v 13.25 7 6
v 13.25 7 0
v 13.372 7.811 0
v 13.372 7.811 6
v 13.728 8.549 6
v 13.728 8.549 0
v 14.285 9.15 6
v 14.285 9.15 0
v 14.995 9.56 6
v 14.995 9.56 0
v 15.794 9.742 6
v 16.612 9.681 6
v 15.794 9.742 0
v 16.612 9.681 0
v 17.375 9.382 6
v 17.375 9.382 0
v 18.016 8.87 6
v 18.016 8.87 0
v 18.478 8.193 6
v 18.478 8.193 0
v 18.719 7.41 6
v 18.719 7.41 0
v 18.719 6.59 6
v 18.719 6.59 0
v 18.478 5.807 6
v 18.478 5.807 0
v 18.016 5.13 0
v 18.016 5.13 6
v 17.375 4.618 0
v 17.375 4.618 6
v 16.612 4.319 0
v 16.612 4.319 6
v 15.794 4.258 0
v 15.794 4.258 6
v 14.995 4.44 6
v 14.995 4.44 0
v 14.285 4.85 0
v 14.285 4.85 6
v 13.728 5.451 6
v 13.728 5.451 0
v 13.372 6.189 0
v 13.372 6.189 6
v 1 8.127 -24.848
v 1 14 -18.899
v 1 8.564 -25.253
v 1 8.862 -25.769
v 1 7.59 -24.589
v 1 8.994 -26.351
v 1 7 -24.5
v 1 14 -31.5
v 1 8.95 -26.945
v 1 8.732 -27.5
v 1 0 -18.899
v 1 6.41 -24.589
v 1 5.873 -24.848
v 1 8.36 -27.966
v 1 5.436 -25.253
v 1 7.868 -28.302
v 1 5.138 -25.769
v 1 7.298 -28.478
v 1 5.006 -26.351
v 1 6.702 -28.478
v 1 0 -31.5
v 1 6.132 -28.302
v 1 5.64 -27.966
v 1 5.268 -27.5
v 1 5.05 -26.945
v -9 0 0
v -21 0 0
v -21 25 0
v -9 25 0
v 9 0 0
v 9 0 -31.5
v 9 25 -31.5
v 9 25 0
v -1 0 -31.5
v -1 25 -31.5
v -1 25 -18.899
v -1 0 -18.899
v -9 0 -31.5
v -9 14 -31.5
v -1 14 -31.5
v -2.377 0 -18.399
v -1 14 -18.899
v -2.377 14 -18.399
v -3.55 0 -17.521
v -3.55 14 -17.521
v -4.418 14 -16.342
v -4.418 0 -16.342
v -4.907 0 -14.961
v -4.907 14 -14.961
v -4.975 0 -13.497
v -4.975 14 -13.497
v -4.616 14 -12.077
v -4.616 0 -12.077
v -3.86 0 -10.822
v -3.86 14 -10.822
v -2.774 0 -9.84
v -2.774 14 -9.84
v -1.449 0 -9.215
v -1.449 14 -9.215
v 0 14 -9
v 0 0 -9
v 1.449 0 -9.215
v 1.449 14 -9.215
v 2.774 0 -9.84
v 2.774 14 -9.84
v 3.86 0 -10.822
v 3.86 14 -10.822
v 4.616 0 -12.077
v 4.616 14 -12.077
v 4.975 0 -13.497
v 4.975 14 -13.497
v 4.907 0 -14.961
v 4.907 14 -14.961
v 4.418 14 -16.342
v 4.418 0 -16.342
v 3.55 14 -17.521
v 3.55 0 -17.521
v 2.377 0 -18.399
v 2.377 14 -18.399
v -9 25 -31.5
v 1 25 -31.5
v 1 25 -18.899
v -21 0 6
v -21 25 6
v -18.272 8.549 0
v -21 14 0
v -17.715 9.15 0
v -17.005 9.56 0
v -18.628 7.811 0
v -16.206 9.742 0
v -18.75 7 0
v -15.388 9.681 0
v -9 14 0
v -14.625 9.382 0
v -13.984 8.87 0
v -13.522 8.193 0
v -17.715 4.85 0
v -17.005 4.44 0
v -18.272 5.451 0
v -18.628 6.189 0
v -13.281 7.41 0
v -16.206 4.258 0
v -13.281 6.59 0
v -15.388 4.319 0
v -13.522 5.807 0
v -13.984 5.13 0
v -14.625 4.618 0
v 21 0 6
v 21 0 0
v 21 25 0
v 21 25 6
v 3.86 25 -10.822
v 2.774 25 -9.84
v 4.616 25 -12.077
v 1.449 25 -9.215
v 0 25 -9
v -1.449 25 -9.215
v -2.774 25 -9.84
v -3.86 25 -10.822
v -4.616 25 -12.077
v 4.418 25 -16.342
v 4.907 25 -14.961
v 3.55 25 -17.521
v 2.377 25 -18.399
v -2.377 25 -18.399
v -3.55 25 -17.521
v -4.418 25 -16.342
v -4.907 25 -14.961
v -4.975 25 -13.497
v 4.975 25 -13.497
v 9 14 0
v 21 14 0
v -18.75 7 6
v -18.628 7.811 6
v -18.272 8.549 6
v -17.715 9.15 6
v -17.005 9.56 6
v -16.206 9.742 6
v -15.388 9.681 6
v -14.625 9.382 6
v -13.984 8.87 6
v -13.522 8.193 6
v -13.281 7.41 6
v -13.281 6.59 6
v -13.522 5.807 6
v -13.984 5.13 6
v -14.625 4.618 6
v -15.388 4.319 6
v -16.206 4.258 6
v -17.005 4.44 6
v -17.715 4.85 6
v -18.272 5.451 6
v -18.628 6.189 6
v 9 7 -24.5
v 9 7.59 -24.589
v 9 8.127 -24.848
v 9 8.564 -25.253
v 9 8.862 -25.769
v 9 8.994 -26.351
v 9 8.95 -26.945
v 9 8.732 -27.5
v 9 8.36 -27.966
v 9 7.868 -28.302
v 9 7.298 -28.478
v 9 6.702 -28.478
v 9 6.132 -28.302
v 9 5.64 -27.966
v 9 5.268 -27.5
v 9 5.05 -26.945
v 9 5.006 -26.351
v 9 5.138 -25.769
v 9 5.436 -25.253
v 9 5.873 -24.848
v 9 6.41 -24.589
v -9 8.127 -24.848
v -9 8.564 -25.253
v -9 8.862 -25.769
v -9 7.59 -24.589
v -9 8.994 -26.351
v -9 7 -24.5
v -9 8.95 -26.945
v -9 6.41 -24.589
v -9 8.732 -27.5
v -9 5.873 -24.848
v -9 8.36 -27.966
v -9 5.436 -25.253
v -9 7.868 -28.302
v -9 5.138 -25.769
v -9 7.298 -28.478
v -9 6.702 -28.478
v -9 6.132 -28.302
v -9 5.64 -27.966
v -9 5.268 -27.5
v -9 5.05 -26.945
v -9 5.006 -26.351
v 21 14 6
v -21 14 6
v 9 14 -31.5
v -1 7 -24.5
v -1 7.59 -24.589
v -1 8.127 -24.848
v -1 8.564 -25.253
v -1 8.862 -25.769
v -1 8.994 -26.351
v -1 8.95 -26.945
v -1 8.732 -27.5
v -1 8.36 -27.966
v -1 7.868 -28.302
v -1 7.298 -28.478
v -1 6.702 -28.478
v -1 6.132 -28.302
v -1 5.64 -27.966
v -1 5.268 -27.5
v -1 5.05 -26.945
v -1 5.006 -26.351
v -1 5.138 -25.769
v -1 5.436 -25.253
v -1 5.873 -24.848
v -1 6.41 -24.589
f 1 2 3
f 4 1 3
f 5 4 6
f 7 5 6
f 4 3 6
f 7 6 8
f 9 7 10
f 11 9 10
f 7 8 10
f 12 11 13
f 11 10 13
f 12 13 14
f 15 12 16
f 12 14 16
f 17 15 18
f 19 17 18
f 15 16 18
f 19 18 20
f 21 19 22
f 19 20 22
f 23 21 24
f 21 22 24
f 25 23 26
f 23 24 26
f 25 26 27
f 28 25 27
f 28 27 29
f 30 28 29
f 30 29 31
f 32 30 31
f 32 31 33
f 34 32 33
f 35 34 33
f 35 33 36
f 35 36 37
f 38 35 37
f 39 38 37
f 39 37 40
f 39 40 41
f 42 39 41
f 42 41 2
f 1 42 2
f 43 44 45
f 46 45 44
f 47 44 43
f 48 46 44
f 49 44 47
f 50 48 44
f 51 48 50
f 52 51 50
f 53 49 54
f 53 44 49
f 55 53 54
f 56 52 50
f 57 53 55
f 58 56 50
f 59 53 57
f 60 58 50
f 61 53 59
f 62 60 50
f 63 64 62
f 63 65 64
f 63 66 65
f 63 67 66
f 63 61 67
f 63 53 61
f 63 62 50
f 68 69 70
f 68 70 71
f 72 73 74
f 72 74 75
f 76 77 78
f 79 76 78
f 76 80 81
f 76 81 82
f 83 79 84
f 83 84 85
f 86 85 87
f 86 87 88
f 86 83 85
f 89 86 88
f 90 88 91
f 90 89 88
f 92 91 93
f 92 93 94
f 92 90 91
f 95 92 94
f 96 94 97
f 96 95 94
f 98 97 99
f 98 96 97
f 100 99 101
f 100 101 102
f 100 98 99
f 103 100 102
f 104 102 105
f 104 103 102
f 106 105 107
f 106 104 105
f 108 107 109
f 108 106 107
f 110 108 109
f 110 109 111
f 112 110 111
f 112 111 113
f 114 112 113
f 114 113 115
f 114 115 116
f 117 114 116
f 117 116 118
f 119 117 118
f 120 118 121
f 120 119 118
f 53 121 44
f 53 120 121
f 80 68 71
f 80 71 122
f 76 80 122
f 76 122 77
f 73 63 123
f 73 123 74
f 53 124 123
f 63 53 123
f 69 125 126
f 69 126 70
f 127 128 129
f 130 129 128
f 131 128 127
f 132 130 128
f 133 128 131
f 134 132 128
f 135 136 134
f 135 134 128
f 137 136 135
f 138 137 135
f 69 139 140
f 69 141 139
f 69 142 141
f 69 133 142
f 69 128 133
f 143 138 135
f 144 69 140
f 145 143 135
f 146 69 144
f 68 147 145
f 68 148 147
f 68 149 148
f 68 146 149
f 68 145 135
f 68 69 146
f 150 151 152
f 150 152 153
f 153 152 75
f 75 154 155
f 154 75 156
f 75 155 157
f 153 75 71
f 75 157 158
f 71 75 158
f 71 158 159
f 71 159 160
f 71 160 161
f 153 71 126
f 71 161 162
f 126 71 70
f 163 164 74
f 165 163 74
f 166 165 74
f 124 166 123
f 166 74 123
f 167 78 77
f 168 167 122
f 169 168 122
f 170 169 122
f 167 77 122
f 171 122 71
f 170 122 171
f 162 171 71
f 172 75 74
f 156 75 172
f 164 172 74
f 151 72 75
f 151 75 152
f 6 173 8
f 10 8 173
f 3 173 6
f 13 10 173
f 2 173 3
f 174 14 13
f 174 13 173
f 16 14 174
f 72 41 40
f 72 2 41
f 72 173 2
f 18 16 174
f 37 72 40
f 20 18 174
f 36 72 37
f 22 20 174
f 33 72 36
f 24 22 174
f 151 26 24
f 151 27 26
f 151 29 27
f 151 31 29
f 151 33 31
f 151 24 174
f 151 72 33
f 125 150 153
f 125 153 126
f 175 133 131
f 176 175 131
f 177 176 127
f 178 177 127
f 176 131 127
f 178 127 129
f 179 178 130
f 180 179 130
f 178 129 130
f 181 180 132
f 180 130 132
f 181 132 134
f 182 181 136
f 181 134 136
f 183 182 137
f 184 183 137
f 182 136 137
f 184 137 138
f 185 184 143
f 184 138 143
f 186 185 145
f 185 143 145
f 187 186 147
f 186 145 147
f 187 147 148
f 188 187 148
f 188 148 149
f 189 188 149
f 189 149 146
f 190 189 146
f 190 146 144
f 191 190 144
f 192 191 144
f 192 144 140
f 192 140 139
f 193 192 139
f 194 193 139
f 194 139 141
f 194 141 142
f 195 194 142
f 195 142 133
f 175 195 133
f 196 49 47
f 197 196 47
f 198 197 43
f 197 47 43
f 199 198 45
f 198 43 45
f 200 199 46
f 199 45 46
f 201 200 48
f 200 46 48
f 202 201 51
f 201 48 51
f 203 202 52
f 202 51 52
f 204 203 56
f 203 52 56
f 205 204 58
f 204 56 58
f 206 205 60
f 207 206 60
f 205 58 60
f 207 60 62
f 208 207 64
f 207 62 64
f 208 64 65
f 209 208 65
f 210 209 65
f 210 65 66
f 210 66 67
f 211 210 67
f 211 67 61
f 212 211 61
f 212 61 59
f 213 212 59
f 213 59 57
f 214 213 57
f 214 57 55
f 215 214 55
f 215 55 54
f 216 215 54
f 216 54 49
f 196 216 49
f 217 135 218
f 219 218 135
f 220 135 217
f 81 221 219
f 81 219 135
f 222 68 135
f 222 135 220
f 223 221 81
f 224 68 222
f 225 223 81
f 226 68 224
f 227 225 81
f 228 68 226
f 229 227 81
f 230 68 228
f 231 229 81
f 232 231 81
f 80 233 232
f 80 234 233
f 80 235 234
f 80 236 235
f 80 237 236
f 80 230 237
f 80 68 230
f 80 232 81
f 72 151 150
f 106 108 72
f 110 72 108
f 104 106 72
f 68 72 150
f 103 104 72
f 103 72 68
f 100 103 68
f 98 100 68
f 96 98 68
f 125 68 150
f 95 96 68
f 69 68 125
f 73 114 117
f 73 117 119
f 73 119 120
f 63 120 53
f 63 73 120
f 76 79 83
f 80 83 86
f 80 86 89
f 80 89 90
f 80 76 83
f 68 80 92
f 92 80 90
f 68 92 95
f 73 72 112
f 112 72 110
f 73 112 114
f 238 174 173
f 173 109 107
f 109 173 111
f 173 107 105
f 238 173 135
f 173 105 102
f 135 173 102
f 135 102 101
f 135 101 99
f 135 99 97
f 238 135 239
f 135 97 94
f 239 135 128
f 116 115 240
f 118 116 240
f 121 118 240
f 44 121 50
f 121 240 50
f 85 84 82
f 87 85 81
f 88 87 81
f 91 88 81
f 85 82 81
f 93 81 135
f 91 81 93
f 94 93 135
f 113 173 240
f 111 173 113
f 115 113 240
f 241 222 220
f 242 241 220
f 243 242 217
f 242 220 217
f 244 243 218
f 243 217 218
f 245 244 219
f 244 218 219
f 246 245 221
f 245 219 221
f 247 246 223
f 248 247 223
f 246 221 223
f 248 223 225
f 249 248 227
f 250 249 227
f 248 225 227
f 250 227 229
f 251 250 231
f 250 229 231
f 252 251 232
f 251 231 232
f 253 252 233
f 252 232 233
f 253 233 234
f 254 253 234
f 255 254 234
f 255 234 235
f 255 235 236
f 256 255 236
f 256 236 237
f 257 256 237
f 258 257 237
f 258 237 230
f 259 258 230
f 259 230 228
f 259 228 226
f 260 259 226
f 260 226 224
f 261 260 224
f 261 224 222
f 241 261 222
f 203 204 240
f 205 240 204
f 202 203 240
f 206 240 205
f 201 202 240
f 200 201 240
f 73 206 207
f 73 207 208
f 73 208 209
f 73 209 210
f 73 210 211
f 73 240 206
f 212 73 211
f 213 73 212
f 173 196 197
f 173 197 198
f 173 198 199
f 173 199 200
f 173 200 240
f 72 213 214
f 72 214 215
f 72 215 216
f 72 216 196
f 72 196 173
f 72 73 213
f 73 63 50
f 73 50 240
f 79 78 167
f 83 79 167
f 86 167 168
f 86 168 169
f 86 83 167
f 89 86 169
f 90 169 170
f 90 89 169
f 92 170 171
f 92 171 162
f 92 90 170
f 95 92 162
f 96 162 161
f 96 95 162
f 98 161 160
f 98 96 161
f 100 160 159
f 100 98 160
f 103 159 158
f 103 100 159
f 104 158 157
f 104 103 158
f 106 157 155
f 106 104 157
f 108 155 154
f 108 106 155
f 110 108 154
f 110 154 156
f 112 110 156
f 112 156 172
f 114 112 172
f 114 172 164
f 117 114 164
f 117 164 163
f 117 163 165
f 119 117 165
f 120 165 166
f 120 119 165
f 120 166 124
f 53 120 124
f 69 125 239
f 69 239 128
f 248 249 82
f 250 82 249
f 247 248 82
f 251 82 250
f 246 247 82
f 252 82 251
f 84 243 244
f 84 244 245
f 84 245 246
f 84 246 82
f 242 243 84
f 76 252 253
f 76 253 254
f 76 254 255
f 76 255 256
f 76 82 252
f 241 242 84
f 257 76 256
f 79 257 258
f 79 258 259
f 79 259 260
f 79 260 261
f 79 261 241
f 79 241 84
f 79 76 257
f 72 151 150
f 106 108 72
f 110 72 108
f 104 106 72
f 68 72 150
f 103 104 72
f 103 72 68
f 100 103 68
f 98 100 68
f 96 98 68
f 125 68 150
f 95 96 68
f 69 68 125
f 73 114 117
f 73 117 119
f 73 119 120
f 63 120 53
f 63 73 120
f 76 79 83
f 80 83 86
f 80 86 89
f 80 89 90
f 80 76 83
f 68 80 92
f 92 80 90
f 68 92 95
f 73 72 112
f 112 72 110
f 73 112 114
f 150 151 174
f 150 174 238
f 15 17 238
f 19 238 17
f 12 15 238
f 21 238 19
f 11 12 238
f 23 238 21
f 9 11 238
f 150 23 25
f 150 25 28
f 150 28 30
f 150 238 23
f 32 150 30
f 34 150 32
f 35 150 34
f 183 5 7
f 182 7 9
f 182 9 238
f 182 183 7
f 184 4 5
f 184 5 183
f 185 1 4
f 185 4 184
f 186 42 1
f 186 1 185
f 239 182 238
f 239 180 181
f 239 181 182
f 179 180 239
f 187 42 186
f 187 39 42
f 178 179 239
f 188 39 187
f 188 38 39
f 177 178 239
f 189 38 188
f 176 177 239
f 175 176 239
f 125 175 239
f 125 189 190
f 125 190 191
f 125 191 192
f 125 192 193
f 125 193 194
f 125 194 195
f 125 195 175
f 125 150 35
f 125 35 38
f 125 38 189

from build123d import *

# Parameters (mm, degrees)
EXTRUDE_2_DEPTH     = 25
EXTRUDE_6_DEPTH     = 14
SKETCH_5_R          = 2.75
CUT_EXTRUDE_1_DEPTH = 46.367940222
SKETCH_6_R          = 2
CUT_EXTRUDE_2_DEPTH = 51.17220346


with BuildPart() as part:
    # Эскиз2 → Бобышка-Вытянуть2 (new body)
    with BuildSketch(Plane(origin=(0, 0, 0), x_dir=(1, 0, 0), z_dir=(0, 1, 0))):
        with BuildLine():
            Line((-21, 0), (-9, 0))
            Line((-9, 0), (-9, 31.5))
            Line((-9, 31.5), (-1, 31.5))
            Line((-1, 31.5), (-1, 18.898979486))
            ThreePointArc((-1, 18.898979486), (0, 9), (1, 18.898979486))
            Line((1, 18.898979486), (1, 31.5))
            Line((1, 31.5), (9, 31.5))
            Line((9, 31.5), (9, 0))
            Line((9, 0), (21, 0))
            Line((21, 0), (21, -6))
            Line((21, -6), (-21, -6))
            Line((-21, -6), (-21, 0))
        make_face()
    extrude(amount=EXTRUDE_2_DEPTH)


with BuildPart() as body_2:
    # Эскиз2<2> → Бобышка-Вытянуть6 (new body)
    with BuildSketch(Plane(origin=(0, 0, 0), x_dir=(1, 0, 0), z_dir=(0, 1, 0))):
        with BuildLine():
            Line((-21, 0), (-9, 0))
            Line((-9, 0), (-9, 31.5))
            Line((-9, 31.5), (-1, 31.5))
            Line((-1, 31.5), (-1, 18.898979486))
            ThreePointArc((-1, 18.898979486), (0, 9), (1, 18.898979486))
            Line((1, 18.898979486), (1, 31.5))
            Line((1, 31.5), (9, 31.5))
            Line((9, 31.5), (9, 0))
            Line((9, 0), (21, 0))
            Line((21, 0), (21, -6))
            Line((21, -6), (-21, -6))
            Line((-21, -6), (-21, 0))
        make_face()
    extrude(amount=EXTRUDE_6_DEPTH)

    # Эскиз5 → Вырез-Вытянуть1 (cut, through all)
    with BuildSketch(Plane(origin=(0, 0, 0), x_dir=(-1, 0, 0), z_dir=(0, 0, -1))):
        with Locations((-16, 7)):
            Circle(SKETCH_5_R)
        with Locations((16, 7)):
            Circle(SKETCH_5_R)
    extrude(amount=-CUT_EXTRUDE_1_DEPTH, mode=Mode.SUBTRACT)

    # Эскиз6 → Вырез-Вытянуть2 (cut, through all)
    with BuildSketch(Plane.ZY.offset(9)):
        with Locations((-26.5, 7)):
            Circle(SKETCH_6_R)
    extrude(amount=-CUT_EXTRUDE_2_DEPTH, mode=Mode.SUBTRACT)


solid = Compound([part.part, body_2.part])
